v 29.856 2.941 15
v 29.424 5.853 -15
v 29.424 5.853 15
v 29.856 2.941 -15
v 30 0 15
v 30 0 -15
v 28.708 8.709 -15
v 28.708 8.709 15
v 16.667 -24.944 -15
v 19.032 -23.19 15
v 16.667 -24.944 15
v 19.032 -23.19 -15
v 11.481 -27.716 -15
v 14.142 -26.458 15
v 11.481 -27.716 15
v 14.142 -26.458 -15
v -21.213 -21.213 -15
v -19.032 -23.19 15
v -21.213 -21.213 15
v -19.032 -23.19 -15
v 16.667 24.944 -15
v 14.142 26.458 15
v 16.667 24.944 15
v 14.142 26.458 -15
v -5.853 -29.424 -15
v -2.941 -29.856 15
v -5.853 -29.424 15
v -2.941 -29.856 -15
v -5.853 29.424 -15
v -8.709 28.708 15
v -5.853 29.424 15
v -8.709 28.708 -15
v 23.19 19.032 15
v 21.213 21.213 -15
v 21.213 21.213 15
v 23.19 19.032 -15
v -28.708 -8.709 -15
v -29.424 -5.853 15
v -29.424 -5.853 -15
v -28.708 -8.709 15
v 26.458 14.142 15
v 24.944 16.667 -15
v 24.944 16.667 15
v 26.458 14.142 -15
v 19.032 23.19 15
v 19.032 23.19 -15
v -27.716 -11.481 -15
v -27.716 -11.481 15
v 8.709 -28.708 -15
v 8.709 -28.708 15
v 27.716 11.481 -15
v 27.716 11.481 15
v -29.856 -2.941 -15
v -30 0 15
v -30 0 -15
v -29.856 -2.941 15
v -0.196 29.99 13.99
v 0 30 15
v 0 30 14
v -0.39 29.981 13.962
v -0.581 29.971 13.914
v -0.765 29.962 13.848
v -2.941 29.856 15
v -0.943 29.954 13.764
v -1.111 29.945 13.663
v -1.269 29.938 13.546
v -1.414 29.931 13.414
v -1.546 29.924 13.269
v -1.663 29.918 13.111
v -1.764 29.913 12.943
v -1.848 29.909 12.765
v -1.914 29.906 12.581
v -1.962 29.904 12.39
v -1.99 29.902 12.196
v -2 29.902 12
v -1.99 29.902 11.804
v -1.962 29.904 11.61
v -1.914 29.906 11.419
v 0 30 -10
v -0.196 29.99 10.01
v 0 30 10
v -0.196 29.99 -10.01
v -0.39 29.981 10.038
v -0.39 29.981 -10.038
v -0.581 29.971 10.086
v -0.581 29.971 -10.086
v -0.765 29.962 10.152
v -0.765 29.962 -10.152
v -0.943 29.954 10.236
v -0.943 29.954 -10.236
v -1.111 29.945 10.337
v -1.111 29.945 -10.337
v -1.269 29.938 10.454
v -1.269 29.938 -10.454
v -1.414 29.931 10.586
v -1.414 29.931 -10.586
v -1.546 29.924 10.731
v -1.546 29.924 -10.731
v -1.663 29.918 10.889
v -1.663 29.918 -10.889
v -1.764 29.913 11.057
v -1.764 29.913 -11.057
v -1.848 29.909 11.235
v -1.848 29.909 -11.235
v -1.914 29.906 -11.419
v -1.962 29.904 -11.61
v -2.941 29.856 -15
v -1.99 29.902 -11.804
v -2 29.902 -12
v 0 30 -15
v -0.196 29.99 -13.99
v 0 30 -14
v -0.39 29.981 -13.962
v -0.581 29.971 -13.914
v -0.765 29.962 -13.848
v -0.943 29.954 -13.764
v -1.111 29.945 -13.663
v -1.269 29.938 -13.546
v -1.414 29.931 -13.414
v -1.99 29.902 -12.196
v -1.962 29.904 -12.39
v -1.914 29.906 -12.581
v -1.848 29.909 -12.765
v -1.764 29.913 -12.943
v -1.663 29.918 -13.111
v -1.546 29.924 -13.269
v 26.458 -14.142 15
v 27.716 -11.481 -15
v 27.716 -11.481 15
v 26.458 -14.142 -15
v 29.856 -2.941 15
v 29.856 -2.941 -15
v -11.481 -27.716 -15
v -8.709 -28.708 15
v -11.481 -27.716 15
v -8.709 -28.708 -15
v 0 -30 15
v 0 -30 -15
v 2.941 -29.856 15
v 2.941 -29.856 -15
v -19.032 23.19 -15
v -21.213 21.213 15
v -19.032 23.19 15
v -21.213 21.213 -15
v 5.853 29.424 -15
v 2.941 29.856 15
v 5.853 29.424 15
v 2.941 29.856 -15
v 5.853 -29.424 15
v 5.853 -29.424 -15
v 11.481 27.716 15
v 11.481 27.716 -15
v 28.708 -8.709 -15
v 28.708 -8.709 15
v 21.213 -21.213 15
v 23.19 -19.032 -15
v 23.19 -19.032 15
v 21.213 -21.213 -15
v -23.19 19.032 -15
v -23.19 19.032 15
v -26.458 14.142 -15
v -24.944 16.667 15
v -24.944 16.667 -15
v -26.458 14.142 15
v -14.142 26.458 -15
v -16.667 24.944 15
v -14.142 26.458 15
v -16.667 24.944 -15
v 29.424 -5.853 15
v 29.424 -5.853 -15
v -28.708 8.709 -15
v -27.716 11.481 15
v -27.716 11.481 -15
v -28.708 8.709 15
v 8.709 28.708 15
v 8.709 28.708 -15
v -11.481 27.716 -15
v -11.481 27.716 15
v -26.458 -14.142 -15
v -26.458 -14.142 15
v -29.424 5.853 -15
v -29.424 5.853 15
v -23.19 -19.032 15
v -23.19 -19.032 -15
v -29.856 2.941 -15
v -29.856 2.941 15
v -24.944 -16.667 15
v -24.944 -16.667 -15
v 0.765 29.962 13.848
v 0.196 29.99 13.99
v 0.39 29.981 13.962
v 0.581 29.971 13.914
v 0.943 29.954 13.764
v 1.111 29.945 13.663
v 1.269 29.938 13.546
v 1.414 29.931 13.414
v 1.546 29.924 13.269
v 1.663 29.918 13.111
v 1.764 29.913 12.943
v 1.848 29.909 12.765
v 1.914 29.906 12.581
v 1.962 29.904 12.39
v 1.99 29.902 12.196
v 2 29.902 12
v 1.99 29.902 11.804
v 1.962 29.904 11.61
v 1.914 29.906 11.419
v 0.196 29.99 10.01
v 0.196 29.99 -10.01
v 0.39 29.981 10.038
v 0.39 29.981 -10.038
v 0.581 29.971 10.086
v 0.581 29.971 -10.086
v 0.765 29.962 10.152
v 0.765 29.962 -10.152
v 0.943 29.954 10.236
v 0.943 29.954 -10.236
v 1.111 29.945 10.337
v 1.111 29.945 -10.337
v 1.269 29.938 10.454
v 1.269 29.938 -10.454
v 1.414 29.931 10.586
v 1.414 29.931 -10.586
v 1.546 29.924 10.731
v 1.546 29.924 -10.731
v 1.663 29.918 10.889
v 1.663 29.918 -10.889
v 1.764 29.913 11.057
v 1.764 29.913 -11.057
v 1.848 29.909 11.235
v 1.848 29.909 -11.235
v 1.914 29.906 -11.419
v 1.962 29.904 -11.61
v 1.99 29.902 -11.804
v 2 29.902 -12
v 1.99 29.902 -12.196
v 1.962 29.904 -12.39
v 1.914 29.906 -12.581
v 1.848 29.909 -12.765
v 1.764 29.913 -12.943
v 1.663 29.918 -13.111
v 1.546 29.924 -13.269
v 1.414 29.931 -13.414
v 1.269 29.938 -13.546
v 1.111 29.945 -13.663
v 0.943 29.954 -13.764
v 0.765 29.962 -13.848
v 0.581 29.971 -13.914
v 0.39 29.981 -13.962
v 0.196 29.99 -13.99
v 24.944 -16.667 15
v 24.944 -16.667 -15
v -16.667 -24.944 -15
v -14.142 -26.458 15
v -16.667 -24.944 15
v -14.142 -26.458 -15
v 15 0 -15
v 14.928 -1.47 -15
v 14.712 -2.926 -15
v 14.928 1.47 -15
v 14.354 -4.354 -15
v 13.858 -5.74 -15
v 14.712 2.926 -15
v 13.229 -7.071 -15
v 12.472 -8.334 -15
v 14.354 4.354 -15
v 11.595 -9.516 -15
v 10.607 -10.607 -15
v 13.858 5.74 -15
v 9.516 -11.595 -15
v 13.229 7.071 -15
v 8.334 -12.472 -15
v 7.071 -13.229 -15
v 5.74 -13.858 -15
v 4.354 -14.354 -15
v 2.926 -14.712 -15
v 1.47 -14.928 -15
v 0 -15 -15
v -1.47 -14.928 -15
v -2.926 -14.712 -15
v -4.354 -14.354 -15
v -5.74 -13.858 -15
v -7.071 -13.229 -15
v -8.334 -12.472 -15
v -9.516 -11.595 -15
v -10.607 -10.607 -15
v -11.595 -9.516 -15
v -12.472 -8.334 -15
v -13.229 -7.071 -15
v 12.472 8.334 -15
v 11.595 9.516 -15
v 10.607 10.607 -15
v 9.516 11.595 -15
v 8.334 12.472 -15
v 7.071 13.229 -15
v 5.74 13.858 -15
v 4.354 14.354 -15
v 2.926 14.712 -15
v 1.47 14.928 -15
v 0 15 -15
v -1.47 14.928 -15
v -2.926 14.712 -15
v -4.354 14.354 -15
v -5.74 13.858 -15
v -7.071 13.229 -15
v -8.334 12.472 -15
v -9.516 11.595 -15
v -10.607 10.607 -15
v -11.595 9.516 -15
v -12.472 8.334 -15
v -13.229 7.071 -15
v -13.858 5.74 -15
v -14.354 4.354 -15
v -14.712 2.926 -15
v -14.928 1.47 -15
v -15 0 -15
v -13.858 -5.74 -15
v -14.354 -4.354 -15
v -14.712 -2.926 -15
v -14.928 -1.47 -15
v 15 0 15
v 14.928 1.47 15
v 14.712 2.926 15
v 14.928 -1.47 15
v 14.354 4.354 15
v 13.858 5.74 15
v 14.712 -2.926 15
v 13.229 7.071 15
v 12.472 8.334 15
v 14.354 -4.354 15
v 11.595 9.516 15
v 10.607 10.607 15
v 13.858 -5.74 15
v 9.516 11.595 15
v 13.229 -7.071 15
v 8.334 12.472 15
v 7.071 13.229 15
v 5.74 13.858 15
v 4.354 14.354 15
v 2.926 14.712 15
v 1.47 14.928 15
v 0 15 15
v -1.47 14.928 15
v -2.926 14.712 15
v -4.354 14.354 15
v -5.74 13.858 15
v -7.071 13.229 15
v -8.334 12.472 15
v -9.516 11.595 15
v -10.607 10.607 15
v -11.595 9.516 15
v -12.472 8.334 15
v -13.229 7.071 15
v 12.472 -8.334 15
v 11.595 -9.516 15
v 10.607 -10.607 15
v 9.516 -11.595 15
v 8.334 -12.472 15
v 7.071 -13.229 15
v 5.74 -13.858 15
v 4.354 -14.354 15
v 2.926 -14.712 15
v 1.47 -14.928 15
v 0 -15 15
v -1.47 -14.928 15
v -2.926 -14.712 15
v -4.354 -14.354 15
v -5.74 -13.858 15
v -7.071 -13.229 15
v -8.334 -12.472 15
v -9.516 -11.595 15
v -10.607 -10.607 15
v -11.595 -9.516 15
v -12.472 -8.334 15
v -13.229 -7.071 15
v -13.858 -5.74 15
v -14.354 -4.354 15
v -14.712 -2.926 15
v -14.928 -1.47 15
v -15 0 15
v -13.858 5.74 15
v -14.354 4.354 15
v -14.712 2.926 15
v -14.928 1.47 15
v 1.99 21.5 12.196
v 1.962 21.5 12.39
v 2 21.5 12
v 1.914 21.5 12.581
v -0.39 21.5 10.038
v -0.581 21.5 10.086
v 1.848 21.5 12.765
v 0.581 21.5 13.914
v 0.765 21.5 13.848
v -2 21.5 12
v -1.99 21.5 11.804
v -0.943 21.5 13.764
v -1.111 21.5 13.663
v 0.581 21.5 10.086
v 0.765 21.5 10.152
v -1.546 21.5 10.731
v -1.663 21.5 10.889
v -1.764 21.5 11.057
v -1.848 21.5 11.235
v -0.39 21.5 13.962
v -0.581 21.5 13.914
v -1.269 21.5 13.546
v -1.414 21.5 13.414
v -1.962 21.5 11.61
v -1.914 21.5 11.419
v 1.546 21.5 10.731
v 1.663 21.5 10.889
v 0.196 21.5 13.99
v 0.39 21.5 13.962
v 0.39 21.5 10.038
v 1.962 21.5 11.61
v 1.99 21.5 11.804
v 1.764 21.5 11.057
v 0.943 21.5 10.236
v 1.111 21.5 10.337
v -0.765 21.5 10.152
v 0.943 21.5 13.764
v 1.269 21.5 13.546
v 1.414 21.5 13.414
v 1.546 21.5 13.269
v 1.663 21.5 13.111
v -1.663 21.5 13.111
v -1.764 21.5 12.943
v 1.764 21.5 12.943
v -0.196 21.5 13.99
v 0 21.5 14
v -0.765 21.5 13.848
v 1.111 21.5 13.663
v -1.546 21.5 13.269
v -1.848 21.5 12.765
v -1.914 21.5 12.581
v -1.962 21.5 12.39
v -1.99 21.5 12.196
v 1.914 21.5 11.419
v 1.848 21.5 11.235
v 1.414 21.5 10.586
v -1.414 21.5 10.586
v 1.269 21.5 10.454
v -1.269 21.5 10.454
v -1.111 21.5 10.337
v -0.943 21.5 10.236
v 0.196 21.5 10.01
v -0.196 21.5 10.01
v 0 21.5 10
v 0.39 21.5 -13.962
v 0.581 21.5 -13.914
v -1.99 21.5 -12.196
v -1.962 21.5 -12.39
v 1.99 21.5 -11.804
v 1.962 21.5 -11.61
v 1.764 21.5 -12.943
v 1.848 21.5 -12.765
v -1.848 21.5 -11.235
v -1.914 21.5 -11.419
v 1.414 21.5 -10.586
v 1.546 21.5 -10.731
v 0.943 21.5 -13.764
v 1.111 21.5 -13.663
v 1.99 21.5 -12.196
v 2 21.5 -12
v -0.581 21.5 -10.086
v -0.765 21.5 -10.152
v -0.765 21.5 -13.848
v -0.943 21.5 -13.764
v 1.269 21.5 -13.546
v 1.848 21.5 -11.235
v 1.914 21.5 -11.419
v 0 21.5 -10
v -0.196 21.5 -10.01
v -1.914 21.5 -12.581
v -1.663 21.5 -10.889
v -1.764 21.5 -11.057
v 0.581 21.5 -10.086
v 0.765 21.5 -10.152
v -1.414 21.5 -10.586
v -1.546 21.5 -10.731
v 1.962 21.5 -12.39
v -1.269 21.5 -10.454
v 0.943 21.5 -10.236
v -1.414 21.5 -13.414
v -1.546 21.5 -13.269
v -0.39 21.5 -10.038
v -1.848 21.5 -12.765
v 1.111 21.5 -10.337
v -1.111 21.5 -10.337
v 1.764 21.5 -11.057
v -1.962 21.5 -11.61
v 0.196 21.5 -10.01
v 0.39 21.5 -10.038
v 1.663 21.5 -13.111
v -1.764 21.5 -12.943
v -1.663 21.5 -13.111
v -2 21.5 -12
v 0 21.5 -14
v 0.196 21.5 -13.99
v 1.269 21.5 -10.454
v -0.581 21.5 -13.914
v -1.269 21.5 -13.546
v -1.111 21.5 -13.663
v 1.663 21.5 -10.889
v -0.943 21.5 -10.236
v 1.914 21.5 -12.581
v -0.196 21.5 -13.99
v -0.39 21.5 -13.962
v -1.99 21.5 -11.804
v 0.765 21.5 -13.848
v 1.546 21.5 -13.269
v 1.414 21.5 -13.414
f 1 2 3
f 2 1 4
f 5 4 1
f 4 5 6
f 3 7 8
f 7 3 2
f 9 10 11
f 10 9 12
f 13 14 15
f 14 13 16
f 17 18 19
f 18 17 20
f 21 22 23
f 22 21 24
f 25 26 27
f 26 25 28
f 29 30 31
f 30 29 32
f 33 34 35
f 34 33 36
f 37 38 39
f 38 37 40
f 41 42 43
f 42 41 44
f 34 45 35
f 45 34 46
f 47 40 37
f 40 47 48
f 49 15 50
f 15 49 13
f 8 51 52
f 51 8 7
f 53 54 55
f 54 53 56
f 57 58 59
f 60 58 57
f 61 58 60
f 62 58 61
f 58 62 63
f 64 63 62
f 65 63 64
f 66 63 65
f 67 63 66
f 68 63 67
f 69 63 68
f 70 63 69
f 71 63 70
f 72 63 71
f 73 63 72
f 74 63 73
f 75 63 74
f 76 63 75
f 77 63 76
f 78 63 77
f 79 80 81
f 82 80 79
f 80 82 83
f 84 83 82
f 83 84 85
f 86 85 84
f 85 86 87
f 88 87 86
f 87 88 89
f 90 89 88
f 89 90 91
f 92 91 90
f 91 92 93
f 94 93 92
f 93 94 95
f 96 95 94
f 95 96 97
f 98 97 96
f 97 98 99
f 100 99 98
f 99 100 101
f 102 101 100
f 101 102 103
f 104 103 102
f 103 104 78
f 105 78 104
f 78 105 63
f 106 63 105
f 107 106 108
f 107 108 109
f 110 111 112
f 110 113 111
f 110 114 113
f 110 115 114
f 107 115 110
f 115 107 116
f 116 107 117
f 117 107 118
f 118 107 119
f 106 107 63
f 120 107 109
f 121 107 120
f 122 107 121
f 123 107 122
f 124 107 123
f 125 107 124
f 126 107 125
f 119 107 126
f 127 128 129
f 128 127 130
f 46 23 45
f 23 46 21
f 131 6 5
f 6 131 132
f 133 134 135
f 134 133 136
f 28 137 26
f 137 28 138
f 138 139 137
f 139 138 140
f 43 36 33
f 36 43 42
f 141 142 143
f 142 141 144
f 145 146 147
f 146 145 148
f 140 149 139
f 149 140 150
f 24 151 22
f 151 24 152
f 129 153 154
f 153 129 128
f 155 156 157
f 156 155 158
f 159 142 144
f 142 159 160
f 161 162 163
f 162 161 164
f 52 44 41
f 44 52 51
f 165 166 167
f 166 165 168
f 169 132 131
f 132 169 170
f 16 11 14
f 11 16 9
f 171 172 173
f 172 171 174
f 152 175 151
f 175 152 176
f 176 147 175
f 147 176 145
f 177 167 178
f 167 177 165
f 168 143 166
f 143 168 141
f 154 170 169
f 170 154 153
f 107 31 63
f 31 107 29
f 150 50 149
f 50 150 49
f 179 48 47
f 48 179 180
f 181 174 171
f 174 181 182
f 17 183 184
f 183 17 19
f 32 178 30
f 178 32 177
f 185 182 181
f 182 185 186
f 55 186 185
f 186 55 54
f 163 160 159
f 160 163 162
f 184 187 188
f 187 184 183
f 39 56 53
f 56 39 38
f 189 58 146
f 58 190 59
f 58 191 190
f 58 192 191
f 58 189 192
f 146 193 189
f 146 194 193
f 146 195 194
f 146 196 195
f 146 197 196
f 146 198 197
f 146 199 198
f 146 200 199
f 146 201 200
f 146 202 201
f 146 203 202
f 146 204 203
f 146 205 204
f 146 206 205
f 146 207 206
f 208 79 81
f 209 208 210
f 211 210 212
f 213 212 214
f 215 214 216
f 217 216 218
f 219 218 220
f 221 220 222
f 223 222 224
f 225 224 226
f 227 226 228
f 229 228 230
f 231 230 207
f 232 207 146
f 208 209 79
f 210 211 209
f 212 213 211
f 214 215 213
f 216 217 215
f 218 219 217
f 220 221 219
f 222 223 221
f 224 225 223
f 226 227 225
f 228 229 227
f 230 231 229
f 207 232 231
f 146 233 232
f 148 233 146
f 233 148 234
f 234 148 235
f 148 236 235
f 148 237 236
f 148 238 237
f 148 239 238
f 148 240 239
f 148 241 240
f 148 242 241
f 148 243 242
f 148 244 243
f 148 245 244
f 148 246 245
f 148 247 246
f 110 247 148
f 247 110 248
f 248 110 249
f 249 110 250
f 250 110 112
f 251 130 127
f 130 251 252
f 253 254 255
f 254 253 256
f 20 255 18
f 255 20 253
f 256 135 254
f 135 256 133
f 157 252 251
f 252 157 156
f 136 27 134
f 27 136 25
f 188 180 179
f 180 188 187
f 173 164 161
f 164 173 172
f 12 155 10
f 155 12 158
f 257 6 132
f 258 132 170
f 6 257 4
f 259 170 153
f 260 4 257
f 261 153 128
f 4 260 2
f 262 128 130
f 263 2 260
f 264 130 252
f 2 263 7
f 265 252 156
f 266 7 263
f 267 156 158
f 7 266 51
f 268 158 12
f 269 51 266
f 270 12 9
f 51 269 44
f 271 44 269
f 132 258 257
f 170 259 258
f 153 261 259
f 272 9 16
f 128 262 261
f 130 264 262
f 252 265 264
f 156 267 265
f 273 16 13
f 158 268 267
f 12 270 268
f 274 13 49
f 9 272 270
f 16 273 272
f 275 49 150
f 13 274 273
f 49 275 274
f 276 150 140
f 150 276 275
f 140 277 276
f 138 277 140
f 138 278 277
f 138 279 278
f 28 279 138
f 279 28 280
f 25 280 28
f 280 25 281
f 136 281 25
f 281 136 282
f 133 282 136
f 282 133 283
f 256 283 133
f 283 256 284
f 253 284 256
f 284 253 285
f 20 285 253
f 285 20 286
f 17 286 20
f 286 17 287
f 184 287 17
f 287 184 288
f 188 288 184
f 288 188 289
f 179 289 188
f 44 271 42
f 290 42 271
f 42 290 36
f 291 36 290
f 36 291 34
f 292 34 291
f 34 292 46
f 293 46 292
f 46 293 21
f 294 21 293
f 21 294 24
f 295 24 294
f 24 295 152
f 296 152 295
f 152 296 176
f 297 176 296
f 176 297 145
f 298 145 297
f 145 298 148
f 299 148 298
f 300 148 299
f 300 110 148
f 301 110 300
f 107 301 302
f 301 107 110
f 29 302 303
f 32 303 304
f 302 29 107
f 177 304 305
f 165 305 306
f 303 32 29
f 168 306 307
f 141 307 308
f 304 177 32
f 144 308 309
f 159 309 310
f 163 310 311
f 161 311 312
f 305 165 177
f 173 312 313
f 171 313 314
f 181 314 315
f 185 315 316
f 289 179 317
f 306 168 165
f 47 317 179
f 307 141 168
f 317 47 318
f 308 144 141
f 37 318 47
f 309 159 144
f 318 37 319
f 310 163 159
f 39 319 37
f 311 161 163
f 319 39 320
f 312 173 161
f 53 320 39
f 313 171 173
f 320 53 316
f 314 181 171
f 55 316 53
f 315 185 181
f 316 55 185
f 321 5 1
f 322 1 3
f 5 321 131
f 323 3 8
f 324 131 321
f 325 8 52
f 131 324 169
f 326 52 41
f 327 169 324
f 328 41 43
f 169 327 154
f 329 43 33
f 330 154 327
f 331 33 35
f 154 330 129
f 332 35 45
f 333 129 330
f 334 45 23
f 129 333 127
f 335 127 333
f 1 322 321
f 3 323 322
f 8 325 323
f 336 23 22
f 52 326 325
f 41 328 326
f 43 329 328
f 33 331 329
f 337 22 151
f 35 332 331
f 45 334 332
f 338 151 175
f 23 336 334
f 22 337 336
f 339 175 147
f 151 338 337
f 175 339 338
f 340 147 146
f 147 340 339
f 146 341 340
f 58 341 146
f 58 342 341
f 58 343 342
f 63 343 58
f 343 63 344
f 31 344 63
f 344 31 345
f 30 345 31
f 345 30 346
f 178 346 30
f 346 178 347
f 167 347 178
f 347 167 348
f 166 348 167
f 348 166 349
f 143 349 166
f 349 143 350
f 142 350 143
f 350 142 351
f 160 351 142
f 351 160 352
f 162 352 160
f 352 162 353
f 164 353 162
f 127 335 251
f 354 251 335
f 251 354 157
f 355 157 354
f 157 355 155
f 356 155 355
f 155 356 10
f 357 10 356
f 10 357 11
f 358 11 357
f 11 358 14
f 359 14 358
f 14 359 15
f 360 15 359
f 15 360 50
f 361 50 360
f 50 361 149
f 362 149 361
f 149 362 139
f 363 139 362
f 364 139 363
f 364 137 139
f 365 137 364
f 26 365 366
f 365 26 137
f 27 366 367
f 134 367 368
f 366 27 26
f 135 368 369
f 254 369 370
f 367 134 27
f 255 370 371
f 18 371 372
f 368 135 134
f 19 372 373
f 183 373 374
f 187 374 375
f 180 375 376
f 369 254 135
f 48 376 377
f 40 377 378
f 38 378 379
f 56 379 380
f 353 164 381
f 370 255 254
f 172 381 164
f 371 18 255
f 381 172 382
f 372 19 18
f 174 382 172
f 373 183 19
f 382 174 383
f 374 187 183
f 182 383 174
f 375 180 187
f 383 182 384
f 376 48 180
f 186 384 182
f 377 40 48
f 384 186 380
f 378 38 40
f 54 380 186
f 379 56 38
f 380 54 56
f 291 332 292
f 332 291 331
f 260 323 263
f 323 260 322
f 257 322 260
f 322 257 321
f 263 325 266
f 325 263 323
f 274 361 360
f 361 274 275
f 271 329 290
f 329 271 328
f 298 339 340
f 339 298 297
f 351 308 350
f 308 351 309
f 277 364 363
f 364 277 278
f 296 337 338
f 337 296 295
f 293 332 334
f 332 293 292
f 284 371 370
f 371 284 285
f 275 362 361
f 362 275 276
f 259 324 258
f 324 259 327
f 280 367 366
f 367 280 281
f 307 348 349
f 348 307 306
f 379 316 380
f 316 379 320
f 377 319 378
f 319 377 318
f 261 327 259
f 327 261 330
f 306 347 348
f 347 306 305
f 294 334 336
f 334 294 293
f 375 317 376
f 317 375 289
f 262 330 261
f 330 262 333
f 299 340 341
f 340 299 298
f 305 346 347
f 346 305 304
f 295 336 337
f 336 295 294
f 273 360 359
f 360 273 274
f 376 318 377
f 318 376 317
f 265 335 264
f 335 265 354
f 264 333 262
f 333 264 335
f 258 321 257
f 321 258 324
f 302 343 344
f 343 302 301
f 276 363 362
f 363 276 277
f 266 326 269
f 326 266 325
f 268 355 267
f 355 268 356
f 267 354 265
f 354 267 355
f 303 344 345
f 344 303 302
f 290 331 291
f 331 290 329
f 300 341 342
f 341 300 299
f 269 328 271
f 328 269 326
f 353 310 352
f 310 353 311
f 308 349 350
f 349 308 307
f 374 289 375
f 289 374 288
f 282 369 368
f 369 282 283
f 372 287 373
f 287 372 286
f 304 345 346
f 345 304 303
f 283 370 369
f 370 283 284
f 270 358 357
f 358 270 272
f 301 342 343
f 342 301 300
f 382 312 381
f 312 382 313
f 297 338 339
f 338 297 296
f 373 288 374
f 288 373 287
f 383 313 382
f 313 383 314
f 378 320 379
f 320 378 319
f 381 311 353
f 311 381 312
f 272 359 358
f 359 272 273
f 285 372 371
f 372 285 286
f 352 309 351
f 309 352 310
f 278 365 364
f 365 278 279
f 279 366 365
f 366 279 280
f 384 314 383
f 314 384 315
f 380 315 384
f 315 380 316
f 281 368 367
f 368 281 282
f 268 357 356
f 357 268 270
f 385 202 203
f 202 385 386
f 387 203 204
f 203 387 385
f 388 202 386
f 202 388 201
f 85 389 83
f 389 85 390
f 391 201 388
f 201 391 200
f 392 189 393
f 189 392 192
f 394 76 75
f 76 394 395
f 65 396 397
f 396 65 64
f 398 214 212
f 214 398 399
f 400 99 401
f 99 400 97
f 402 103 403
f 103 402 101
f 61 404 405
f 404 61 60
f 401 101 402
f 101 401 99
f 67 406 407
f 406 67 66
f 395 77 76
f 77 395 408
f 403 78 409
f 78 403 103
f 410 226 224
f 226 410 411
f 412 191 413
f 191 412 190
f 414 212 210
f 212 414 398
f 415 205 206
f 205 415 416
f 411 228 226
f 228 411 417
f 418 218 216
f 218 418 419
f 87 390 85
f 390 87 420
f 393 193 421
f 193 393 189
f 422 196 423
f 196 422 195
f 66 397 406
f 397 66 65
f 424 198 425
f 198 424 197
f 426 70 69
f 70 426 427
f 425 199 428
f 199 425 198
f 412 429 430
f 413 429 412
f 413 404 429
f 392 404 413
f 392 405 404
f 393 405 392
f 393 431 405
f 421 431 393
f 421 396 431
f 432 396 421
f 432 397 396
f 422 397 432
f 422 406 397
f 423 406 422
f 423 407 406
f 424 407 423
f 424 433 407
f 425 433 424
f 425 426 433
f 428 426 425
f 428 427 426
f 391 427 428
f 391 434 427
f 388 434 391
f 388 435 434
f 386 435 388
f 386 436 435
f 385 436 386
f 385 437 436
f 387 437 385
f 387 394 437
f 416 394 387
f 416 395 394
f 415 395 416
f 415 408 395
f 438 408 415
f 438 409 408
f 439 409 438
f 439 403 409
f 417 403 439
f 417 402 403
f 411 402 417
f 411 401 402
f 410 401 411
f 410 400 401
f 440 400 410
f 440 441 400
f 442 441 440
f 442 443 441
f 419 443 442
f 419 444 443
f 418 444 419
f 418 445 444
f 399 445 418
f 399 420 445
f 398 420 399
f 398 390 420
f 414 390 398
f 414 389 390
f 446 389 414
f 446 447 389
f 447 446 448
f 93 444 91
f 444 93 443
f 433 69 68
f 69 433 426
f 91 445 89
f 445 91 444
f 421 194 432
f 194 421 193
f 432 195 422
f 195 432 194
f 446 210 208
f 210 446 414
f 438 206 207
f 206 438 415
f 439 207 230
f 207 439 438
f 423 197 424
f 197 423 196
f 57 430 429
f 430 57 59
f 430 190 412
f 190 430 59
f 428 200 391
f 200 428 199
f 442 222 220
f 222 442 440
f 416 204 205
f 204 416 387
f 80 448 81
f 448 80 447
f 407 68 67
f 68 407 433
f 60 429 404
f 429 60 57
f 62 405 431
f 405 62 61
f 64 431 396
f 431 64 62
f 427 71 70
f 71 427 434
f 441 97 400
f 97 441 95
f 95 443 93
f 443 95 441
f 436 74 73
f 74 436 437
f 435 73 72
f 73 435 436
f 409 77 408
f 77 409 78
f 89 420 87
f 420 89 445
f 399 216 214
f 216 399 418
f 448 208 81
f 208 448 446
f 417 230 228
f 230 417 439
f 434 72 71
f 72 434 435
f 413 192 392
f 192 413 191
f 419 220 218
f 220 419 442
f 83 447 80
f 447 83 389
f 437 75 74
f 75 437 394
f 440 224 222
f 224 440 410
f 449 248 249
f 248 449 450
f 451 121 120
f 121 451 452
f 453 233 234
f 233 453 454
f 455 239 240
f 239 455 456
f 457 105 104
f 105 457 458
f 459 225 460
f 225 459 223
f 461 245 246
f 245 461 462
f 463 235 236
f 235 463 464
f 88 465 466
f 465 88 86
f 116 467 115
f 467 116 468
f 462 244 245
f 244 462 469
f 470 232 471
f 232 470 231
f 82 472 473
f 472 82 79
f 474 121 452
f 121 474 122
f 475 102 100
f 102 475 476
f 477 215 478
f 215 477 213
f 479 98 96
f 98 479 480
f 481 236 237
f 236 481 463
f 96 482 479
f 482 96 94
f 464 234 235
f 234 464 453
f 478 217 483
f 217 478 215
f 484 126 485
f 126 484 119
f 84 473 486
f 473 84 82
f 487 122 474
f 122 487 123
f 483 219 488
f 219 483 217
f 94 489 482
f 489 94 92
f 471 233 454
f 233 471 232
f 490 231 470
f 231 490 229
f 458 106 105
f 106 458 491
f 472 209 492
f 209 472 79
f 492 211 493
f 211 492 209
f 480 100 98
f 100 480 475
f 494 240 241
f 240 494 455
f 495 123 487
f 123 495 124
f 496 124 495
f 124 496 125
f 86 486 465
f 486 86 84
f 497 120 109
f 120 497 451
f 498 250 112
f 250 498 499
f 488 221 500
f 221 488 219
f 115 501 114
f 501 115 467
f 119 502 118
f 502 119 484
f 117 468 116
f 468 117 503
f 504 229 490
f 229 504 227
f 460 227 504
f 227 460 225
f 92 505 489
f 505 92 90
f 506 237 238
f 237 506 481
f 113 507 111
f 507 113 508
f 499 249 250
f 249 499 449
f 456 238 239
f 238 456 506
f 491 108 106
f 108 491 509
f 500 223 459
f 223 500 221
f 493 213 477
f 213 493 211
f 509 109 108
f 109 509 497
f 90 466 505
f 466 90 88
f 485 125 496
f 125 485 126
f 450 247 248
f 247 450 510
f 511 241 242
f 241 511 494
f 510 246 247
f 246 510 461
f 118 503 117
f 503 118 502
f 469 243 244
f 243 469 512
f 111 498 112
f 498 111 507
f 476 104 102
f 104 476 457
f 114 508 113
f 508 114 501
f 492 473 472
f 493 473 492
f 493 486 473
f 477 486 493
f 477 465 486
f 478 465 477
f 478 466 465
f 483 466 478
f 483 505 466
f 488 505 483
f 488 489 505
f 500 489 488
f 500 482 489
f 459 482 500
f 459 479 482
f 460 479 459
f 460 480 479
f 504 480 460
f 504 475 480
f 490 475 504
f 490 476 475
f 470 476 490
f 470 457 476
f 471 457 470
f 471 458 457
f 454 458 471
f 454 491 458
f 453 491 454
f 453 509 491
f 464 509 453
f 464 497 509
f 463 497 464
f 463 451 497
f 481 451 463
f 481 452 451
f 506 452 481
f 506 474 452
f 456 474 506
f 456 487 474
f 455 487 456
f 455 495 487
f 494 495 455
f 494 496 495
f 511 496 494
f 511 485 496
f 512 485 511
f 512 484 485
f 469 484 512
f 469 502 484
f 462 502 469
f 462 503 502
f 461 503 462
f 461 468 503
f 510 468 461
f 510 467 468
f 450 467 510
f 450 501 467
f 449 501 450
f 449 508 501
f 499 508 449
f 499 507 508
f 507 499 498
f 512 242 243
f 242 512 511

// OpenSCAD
// COBRA Vertebra - C6 V5
// Height: 30.0mm, OD: 60.0mm

$fn = 64;

difference() {
    // Outer cylinder
    cylinder(h=30.0, d=60.0, center=true);
    
    // Inner channel
    cylinder(h=32.0, d=30.0, center=true);

    // Pivot holes
    translate([0, 30.0, 12.0])
    rotate([90, 0, 0])
    cylinder(h=17.0, d=4, center=true);
    
    translate([0, 30.0, -12.0])
    rotate([90, 0, 0])
    cylinder(h=17.0, d=4, center=true);
}
